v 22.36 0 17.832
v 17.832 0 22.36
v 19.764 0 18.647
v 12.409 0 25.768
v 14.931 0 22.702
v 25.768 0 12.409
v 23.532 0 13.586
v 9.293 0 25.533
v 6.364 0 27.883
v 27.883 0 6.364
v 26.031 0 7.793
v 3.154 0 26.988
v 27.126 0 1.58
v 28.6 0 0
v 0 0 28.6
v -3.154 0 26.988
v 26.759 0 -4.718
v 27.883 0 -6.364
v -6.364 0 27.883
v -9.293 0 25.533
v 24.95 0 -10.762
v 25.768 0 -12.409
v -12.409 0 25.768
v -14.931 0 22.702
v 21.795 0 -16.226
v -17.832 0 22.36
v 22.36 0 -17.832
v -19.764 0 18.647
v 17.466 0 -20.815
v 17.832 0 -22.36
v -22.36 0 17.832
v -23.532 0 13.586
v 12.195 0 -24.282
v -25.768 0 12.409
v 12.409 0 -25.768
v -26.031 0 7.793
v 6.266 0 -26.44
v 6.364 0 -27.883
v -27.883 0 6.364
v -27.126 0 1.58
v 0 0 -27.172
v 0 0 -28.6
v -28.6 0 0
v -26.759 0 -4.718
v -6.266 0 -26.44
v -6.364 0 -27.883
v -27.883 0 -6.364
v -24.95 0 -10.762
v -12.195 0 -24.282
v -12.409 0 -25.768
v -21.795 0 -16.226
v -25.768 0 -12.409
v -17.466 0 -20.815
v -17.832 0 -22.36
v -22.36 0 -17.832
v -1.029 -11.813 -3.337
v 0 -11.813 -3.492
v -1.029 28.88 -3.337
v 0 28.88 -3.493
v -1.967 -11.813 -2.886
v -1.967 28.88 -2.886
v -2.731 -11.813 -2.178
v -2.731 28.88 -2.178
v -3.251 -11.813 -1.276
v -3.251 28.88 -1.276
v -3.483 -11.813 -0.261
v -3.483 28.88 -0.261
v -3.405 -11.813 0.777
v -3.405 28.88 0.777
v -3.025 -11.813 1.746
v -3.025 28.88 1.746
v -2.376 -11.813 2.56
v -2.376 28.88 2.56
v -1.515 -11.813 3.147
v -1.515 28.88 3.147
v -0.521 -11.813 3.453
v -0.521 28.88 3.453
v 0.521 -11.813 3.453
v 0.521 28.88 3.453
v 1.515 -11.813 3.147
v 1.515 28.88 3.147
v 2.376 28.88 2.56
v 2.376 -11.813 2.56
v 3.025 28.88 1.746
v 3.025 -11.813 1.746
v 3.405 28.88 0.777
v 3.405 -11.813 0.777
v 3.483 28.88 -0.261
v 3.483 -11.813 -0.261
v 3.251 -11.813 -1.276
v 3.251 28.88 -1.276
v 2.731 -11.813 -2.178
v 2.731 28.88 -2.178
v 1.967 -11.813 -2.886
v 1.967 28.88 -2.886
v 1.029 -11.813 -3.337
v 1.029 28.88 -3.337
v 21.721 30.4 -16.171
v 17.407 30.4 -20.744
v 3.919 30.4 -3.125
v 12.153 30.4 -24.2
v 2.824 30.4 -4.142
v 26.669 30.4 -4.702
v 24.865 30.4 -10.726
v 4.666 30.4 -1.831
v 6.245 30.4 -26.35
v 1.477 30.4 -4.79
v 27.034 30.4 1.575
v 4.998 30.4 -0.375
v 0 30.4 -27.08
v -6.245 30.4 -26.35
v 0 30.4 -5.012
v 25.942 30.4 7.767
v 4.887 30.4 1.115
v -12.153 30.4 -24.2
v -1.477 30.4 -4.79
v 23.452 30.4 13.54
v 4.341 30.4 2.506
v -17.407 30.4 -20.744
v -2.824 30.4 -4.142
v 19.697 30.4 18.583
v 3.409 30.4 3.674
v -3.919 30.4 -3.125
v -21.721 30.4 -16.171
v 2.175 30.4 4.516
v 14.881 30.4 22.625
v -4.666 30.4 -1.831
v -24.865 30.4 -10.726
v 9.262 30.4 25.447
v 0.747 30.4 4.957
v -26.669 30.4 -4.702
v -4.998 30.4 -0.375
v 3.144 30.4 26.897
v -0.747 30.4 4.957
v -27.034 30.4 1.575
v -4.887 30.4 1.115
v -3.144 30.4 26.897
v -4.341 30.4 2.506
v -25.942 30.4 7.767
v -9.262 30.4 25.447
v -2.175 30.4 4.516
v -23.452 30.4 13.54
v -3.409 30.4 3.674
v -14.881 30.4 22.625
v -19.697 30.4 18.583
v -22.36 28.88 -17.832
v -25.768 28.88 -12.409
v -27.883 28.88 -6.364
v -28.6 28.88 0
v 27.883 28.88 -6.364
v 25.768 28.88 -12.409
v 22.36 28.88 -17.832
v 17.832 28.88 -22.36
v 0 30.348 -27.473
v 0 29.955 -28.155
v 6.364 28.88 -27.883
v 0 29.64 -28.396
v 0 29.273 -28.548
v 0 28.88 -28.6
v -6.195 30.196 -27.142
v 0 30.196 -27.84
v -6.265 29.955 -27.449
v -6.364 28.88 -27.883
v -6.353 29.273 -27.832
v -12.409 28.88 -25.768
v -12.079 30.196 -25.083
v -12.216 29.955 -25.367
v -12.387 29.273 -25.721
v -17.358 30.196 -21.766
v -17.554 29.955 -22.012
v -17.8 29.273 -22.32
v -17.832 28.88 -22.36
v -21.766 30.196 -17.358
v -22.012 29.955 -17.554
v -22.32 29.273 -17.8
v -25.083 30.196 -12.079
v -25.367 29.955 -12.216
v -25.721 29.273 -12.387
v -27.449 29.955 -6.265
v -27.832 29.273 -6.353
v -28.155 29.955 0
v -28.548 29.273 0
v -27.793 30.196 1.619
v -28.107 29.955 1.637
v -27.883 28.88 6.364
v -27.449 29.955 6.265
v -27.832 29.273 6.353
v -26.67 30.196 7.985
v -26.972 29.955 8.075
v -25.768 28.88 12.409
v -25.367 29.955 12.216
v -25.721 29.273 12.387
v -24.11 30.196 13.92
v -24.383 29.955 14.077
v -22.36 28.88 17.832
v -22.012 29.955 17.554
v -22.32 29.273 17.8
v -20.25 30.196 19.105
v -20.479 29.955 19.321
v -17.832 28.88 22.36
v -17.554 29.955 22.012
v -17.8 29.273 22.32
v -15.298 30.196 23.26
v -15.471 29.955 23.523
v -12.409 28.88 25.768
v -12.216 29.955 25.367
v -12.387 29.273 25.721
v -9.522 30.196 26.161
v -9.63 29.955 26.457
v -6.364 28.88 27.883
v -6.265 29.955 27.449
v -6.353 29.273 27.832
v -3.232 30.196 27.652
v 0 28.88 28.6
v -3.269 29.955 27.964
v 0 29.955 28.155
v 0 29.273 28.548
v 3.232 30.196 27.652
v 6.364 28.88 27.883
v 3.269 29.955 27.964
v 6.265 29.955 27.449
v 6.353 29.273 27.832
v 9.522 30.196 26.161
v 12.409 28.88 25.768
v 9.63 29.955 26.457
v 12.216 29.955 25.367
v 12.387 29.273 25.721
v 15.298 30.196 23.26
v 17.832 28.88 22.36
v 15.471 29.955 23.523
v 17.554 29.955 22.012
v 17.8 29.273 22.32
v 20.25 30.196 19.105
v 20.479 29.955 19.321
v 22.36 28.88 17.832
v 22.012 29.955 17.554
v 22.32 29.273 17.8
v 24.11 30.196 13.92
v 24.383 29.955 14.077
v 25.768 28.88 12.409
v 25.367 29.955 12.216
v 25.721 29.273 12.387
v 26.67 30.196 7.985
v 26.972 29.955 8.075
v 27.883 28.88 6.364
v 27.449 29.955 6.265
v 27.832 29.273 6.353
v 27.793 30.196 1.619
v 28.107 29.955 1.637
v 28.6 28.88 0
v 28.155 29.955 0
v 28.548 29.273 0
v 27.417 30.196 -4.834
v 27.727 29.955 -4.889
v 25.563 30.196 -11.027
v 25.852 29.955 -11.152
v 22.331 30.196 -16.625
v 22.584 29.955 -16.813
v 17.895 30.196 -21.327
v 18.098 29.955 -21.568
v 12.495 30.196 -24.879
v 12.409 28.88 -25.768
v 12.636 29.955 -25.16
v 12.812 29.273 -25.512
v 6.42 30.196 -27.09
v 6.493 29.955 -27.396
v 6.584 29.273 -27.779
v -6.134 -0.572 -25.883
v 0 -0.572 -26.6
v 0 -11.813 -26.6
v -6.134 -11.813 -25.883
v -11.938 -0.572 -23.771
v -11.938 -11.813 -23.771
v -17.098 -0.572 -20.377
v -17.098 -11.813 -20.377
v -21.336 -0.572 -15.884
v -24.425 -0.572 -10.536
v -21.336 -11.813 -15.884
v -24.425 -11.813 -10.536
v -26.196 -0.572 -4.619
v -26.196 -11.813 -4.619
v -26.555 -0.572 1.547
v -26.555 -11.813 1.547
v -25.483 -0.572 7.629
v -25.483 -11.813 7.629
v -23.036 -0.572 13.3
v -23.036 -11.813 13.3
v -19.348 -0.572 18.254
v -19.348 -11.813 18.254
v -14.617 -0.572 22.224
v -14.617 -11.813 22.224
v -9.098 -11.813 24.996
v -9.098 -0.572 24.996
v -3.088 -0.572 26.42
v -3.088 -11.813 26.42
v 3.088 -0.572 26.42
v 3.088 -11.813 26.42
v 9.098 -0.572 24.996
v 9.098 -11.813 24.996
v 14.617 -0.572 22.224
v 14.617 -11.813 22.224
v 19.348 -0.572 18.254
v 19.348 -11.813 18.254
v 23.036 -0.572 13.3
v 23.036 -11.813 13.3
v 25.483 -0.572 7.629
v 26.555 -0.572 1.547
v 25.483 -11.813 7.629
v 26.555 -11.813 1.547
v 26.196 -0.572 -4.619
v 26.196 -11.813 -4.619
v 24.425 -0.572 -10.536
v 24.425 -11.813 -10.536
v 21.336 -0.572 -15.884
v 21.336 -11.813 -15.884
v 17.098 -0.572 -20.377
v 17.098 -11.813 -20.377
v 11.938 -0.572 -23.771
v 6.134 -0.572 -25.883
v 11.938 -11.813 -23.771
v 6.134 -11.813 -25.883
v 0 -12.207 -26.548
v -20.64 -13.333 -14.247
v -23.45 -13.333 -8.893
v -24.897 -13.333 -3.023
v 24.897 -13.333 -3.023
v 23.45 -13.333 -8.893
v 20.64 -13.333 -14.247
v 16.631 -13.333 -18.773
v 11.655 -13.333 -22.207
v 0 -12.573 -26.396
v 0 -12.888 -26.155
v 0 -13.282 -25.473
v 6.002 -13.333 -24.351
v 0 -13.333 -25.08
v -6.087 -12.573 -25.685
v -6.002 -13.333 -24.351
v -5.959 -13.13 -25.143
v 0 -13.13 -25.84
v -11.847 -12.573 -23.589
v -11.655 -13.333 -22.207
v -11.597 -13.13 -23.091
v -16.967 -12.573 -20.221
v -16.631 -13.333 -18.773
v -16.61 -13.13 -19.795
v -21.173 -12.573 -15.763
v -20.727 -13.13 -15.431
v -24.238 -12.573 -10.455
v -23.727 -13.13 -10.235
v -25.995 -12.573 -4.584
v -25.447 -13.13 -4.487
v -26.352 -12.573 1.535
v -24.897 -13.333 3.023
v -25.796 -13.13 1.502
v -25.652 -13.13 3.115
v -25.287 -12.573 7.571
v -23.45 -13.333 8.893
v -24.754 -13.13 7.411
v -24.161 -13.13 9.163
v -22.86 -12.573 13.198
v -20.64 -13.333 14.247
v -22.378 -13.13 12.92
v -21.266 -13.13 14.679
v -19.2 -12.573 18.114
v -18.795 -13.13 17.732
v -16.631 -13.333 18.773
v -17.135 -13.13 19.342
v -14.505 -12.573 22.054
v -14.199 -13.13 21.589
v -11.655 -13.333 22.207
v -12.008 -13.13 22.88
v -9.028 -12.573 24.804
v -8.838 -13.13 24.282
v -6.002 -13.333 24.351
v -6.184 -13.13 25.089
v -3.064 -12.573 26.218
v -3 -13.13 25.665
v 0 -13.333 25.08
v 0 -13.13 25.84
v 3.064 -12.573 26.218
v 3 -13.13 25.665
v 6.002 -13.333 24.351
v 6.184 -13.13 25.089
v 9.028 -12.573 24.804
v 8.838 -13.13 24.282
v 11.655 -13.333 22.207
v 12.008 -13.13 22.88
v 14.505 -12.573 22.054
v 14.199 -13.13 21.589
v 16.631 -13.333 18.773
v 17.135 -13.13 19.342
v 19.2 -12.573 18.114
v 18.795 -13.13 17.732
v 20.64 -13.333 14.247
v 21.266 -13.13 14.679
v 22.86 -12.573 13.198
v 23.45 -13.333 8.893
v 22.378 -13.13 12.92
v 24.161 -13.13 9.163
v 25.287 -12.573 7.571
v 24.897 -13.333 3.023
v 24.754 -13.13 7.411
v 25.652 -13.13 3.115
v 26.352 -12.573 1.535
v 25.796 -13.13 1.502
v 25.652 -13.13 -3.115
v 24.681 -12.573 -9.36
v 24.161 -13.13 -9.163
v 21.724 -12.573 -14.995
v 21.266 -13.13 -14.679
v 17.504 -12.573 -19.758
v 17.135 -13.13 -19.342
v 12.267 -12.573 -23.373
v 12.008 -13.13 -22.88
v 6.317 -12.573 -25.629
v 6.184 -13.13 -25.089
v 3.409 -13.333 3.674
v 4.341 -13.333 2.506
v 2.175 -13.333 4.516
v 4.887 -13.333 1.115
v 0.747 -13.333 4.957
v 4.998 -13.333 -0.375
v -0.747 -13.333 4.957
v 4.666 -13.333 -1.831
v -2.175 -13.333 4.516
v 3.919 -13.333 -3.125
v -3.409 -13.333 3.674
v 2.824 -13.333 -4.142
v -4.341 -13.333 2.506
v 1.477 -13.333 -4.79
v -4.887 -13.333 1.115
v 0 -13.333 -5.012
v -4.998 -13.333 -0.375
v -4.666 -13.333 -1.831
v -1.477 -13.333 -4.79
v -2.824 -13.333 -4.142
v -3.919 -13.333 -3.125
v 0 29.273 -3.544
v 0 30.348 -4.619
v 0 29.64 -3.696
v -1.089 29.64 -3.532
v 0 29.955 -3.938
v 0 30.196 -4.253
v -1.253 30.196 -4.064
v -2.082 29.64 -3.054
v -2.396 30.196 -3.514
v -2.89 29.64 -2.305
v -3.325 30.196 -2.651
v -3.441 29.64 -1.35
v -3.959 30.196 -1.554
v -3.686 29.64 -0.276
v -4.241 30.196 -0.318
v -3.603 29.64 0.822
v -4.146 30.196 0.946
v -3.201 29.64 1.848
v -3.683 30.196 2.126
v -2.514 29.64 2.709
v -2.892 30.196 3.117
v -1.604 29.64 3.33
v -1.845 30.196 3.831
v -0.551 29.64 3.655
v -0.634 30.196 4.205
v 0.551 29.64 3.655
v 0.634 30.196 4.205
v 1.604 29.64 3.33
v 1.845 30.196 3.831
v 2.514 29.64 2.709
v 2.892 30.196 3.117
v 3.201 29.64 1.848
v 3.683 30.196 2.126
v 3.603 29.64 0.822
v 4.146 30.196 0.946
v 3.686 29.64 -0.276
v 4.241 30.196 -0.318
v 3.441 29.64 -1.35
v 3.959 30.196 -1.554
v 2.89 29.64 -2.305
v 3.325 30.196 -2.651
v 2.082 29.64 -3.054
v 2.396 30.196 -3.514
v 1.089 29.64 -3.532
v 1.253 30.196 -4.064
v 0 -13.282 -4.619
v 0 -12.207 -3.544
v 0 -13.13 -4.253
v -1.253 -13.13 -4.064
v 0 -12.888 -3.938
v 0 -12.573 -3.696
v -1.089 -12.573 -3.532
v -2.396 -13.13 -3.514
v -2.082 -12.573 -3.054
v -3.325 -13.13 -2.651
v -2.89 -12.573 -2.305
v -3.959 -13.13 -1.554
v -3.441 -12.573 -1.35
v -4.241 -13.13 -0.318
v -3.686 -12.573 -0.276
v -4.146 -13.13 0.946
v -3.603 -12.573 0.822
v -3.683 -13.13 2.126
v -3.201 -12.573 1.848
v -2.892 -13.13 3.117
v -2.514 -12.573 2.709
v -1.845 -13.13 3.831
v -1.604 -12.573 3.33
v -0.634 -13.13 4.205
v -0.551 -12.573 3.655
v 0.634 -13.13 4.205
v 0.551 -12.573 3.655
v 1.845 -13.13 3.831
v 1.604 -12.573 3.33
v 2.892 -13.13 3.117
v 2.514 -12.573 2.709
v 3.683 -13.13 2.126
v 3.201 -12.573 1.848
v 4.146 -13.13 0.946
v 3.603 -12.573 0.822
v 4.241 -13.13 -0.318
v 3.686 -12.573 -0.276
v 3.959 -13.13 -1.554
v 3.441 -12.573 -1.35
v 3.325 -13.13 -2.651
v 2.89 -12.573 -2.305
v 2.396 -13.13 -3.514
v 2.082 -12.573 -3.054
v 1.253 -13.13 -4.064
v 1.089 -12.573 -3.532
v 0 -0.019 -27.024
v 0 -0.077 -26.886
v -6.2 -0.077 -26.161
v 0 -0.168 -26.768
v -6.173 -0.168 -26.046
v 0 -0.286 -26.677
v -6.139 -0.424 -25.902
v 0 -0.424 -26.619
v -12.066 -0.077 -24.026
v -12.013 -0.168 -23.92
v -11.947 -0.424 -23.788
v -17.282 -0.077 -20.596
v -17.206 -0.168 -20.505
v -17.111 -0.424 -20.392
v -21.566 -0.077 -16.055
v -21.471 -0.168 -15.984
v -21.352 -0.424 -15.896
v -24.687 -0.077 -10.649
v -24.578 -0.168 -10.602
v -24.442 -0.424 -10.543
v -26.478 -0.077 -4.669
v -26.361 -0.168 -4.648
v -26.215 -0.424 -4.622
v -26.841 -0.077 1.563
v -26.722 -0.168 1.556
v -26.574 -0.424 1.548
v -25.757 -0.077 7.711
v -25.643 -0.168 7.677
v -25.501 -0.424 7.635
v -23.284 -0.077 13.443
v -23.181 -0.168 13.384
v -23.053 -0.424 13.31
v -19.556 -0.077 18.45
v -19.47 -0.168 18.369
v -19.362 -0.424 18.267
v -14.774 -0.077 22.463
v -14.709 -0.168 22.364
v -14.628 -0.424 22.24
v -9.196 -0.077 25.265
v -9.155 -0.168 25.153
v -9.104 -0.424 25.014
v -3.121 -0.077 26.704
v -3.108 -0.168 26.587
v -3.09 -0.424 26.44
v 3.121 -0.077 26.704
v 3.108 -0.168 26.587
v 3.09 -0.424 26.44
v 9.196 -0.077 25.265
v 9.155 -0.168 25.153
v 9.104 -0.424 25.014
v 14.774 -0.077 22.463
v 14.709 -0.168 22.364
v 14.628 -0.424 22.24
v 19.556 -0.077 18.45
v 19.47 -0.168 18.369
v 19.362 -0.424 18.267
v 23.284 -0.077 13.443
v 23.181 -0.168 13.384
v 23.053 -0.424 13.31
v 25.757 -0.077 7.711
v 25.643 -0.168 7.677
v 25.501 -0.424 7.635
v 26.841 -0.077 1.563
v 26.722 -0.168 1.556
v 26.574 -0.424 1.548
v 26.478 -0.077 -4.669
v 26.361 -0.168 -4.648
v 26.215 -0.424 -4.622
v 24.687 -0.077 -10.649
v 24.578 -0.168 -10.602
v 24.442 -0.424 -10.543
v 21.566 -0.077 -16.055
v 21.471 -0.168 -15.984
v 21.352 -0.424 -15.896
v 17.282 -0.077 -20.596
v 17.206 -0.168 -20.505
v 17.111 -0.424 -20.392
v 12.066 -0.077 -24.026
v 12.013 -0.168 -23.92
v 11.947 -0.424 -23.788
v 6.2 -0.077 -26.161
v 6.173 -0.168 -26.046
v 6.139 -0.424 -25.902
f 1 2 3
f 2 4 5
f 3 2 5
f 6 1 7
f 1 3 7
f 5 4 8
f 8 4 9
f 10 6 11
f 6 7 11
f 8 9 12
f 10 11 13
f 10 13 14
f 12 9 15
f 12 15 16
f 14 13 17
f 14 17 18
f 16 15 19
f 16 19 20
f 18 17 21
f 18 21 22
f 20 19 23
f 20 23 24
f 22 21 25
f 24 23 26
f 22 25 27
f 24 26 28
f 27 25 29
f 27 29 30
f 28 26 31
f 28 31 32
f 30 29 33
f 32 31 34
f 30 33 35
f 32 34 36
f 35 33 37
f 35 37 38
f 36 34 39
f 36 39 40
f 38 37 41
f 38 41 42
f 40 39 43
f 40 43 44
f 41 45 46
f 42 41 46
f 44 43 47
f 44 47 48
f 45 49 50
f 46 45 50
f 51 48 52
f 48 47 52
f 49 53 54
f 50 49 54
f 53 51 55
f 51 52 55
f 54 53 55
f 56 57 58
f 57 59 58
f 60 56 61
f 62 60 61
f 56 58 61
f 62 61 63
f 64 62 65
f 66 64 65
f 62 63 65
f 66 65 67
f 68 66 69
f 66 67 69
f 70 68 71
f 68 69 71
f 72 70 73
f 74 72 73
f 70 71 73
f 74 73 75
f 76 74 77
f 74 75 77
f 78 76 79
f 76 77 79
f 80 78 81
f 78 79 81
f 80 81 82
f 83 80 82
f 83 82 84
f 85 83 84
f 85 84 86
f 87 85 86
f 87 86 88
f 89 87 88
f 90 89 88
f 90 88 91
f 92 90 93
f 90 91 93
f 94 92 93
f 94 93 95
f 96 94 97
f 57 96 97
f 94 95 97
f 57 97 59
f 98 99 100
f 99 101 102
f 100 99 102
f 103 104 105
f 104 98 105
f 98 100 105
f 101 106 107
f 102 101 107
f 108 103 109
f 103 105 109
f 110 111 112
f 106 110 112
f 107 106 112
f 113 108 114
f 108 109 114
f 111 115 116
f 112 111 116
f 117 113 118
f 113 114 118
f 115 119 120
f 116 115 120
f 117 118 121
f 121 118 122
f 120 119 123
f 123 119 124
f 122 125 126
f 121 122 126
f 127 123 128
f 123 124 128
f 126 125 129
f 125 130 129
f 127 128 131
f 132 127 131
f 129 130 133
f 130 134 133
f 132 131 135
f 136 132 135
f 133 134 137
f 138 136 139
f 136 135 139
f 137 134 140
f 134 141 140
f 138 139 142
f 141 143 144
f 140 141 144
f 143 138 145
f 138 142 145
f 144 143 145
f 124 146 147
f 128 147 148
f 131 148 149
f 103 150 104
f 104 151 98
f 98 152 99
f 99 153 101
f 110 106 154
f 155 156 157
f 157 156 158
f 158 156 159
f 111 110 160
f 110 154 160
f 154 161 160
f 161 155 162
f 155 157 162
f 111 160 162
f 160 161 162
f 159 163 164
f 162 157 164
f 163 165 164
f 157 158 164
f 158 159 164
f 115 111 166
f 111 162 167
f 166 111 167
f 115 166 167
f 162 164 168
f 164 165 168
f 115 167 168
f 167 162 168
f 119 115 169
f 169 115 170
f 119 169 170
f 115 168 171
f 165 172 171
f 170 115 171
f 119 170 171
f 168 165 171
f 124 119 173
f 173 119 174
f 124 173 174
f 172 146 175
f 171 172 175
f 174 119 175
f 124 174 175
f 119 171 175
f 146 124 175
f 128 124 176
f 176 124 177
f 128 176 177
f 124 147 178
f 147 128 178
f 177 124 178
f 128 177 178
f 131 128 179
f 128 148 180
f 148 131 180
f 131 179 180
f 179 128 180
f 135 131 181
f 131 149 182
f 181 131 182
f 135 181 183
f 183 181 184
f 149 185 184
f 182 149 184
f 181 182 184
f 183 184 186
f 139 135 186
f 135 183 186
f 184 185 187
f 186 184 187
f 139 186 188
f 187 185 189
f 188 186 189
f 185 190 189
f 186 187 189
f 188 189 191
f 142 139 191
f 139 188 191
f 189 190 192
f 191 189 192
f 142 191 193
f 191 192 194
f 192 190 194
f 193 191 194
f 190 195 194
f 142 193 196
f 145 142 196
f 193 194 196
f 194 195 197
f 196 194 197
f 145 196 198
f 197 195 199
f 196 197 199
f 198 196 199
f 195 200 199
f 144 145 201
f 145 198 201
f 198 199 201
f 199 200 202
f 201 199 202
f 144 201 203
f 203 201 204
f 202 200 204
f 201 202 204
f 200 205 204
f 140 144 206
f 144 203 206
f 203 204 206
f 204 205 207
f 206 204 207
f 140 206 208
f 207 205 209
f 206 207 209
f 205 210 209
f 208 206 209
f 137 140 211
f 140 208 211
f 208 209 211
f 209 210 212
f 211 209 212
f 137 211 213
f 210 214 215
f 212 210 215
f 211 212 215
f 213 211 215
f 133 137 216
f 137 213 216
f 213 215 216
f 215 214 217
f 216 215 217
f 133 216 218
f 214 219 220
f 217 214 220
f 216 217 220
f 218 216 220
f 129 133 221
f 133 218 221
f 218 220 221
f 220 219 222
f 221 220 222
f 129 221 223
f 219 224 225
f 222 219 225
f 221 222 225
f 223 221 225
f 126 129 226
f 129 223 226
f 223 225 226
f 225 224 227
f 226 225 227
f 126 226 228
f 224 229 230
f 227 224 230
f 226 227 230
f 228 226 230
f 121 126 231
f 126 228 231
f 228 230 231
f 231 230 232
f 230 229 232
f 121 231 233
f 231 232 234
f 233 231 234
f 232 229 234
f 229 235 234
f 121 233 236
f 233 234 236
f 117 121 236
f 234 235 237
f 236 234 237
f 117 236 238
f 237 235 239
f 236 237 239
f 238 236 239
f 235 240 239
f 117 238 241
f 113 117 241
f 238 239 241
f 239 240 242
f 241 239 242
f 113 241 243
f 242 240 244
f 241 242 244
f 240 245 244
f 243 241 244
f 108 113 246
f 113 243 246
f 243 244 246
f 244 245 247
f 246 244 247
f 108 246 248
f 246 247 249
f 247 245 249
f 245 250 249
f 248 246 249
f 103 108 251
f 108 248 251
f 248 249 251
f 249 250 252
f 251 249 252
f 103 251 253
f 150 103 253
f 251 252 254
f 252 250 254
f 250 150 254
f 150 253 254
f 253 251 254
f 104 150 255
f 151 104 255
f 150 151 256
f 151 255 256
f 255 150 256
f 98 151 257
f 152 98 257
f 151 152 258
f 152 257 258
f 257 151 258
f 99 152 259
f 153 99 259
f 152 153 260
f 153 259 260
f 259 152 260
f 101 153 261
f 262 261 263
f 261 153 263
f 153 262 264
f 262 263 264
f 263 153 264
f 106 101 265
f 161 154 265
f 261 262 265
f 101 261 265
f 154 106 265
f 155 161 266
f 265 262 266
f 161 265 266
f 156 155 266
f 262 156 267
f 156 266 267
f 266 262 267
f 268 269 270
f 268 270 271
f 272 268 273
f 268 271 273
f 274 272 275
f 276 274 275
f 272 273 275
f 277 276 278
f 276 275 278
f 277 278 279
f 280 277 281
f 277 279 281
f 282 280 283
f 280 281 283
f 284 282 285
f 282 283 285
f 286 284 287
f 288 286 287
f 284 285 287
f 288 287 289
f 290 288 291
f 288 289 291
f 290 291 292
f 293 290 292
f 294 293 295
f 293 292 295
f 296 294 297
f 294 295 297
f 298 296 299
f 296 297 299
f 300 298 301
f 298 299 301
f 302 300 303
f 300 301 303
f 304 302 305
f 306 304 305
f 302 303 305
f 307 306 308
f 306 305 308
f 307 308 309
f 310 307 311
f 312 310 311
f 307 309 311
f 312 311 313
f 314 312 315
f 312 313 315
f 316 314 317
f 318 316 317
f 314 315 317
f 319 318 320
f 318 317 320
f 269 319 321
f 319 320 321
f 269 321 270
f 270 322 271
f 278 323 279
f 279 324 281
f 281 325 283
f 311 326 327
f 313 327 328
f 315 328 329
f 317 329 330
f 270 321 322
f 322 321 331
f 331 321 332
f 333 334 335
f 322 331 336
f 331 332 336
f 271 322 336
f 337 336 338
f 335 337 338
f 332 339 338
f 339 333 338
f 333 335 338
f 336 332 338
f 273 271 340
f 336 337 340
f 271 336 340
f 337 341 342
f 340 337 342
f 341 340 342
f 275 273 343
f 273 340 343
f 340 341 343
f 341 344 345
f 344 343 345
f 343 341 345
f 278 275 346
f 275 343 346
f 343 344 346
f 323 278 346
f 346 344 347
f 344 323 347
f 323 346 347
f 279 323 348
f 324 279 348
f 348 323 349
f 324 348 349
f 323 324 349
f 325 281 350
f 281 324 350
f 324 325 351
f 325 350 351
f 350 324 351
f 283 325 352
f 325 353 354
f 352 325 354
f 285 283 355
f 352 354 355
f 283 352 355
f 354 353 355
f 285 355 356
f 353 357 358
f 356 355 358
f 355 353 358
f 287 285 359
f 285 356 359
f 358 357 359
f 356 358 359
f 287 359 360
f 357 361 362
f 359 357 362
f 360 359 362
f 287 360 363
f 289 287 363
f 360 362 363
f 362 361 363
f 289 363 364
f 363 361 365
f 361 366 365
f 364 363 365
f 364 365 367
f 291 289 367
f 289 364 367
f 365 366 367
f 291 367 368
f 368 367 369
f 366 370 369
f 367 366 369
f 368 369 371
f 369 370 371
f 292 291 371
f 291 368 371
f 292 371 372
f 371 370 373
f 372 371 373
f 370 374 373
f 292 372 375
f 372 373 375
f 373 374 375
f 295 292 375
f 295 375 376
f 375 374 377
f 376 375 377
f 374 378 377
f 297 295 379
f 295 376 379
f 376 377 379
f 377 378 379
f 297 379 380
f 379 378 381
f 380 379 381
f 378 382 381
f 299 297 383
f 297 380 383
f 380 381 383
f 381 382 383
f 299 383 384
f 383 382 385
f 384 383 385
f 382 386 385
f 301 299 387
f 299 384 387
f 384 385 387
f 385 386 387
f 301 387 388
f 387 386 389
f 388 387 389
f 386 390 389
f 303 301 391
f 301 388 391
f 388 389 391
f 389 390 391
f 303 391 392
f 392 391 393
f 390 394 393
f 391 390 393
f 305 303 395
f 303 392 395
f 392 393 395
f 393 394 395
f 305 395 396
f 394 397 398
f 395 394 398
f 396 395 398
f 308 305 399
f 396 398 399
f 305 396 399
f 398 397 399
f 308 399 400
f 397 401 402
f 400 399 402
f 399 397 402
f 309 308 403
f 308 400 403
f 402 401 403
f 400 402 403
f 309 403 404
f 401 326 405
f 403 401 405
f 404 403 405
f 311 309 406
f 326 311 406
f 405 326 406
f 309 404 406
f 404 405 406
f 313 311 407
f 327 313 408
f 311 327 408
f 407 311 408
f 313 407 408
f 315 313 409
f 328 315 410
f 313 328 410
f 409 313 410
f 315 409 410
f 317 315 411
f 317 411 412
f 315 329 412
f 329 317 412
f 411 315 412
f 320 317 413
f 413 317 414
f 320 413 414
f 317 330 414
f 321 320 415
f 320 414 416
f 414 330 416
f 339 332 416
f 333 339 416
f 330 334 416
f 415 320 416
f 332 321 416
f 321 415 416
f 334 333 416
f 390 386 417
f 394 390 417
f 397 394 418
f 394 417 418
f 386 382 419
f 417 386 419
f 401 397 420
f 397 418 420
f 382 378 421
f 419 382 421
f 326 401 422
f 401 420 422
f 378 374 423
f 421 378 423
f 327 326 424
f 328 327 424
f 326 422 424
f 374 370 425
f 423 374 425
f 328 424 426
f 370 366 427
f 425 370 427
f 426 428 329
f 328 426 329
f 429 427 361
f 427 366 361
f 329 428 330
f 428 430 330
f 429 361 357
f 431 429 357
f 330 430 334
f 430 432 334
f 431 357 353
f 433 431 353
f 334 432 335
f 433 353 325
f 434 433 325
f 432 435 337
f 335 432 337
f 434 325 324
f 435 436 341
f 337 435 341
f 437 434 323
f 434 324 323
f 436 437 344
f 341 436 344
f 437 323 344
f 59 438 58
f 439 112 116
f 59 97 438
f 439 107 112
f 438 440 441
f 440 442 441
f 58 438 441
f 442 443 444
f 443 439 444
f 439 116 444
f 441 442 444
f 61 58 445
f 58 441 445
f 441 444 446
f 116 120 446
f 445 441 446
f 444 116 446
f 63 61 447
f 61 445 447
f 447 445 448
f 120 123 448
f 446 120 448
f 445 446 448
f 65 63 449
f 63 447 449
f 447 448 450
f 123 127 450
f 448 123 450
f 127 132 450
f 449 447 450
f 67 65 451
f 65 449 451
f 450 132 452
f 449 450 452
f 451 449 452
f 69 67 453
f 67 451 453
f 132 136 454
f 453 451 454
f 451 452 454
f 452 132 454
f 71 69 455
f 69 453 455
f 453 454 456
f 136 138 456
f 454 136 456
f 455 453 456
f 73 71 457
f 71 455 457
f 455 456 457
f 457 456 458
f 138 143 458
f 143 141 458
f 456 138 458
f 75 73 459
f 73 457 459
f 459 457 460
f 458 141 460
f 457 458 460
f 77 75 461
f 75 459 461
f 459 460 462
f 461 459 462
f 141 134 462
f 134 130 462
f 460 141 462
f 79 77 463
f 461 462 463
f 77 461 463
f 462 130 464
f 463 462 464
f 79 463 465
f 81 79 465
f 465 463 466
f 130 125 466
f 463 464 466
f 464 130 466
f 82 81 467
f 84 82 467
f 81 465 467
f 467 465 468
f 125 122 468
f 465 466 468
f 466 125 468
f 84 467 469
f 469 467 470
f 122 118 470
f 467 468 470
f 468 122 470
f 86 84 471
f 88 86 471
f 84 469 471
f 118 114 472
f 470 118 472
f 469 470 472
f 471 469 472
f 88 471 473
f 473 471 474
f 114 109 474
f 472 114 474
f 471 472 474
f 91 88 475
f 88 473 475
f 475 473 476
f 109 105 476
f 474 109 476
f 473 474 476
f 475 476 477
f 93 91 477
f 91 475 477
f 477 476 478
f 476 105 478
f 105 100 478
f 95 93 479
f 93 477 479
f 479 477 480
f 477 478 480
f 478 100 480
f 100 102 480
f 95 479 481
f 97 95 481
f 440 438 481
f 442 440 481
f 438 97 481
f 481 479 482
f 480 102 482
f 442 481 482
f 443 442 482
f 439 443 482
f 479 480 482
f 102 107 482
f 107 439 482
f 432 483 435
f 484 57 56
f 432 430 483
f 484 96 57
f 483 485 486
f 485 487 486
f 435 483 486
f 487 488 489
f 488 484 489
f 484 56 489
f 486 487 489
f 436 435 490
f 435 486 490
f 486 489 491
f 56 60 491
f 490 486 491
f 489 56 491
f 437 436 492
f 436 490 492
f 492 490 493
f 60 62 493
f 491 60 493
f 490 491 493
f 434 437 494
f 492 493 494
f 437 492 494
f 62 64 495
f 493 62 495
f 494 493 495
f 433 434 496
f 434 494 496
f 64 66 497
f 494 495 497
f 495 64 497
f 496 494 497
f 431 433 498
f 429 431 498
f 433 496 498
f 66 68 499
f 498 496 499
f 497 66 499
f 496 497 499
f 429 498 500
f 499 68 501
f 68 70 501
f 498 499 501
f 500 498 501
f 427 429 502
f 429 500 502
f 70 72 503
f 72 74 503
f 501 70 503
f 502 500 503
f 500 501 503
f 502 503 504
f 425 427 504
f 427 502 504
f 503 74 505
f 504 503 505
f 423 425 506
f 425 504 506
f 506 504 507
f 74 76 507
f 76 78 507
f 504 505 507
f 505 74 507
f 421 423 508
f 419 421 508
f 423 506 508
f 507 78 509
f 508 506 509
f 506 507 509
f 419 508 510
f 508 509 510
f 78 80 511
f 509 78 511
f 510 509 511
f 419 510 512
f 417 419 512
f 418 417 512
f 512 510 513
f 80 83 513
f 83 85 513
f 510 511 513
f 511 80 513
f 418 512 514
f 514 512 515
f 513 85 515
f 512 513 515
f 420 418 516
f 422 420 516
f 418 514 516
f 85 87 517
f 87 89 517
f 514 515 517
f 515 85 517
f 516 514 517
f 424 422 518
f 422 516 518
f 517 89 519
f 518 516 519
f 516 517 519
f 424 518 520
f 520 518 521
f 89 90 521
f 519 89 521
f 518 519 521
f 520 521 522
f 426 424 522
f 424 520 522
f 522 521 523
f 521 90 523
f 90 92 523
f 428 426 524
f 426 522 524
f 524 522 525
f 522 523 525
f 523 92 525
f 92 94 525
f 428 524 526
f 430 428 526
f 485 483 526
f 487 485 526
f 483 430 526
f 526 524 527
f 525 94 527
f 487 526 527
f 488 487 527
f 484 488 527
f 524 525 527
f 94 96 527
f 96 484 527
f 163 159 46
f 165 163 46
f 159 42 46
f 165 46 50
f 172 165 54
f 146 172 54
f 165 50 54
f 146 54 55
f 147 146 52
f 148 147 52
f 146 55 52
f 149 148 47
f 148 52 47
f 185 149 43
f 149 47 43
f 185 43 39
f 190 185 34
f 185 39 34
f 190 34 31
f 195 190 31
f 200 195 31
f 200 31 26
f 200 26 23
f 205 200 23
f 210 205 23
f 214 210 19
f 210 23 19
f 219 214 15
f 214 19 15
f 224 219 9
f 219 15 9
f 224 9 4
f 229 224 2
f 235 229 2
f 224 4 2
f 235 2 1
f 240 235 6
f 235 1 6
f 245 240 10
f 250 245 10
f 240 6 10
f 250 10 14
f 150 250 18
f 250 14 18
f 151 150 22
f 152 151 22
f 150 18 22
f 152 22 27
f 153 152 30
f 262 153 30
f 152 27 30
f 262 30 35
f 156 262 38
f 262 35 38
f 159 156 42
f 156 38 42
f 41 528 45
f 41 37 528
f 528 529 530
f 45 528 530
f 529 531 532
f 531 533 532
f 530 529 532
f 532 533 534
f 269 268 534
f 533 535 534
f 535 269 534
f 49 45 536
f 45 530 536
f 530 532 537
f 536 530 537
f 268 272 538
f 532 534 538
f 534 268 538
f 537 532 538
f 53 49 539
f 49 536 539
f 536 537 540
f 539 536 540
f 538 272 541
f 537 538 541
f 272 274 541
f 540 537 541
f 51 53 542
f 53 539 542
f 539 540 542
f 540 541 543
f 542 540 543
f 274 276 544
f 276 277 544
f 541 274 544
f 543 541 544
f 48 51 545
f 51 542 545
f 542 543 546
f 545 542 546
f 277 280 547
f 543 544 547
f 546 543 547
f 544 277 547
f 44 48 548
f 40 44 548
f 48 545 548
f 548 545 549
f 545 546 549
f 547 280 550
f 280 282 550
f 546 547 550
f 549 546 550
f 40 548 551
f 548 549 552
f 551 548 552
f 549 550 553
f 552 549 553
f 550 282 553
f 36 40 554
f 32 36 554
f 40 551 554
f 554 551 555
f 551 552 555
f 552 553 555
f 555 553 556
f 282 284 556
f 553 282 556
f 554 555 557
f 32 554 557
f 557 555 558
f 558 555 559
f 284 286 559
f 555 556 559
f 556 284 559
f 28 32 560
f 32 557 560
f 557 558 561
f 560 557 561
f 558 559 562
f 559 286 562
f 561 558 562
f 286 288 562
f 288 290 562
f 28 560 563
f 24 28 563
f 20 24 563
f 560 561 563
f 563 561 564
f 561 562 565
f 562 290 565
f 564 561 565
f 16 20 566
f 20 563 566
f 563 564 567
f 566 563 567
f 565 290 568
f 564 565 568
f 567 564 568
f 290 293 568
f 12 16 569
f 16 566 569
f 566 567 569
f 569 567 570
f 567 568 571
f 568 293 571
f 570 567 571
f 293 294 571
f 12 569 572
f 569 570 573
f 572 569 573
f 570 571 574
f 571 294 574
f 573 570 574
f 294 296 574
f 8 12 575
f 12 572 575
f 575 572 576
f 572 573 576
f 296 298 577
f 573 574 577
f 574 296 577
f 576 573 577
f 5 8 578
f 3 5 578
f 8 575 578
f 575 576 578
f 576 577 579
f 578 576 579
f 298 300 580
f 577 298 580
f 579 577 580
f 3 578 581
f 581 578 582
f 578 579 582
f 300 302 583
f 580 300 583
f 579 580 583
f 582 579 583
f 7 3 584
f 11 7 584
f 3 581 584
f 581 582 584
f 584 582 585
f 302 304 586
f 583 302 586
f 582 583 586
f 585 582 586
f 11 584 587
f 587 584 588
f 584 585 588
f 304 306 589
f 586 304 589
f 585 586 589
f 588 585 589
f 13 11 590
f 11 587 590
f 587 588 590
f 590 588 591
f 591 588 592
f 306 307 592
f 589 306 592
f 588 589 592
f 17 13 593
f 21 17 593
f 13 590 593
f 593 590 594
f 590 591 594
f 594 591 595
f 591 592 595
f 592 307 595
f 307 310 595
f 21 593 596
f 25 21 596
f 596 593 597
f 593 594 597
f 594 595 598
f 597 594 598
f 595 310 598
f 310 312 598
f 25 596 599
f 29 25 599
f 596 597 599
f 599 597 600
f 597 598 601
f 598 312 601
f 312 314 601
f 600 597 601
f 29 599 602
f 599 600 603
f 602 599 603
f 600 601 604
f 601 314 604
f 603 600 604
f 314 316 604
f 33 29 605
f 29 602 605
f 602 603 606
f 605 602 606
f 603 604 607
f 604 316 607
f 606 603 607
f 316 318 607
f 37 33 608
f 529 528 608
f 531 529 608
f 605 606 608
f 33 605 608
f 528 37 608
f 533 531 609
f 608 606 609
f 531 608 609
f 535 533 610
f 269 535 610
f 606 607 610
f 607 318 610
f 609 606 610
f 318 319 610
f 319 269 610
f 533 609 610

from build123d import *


with BuildPart() as part:
    # Sketch1 → Revolve1 (revolve)
    with BuildSketch(Plane.XY, mode=Mode.PRIVATE) as revolve1_sk:
        with BuildLine():
            Line((3.4925, -11.813333327), (3.4925, 28.88))
            ThreePointArc((3.4925, 28.88), (3.937697693, 29.954802307), (5.0125, 30.4))
            Line((5.0125, 30.4), (27.08, 30.4))
            ThreePointArc((27.08, 30.4), (28.154802307, 29.954802307), (28.6, 28.88))
            Line((28.6, 28.88), (28.6, 0))
            Line((28.6, 0), (27.172081158, 0))
            ThreePointArc((27.172081158, 0), (26.767558692, -0.167558692), (26.6, -0.572081158))
            Line((26.6, -0.572081158), (26.6, -11.813333327))
            ThreePointArc((26.6, -11.813333327), (26.154802307, -12.888135634), (25.08, -13.333333327))
            Line((25.08, -13.333333327), (5.0125, -13.333333327))
            ThreePointArc((5.0125, -13.333333327), (3.937697693, -12.888135634), (3.4925, -11.813333327))
        make_face()
    revolve(revolve1_sk.sketch.rotate(Axis((0, 0, 0), (0, 1, 0)), 90), axis=Axis((0, 0, 0), (0, 1, 0)))


solid = part.part
